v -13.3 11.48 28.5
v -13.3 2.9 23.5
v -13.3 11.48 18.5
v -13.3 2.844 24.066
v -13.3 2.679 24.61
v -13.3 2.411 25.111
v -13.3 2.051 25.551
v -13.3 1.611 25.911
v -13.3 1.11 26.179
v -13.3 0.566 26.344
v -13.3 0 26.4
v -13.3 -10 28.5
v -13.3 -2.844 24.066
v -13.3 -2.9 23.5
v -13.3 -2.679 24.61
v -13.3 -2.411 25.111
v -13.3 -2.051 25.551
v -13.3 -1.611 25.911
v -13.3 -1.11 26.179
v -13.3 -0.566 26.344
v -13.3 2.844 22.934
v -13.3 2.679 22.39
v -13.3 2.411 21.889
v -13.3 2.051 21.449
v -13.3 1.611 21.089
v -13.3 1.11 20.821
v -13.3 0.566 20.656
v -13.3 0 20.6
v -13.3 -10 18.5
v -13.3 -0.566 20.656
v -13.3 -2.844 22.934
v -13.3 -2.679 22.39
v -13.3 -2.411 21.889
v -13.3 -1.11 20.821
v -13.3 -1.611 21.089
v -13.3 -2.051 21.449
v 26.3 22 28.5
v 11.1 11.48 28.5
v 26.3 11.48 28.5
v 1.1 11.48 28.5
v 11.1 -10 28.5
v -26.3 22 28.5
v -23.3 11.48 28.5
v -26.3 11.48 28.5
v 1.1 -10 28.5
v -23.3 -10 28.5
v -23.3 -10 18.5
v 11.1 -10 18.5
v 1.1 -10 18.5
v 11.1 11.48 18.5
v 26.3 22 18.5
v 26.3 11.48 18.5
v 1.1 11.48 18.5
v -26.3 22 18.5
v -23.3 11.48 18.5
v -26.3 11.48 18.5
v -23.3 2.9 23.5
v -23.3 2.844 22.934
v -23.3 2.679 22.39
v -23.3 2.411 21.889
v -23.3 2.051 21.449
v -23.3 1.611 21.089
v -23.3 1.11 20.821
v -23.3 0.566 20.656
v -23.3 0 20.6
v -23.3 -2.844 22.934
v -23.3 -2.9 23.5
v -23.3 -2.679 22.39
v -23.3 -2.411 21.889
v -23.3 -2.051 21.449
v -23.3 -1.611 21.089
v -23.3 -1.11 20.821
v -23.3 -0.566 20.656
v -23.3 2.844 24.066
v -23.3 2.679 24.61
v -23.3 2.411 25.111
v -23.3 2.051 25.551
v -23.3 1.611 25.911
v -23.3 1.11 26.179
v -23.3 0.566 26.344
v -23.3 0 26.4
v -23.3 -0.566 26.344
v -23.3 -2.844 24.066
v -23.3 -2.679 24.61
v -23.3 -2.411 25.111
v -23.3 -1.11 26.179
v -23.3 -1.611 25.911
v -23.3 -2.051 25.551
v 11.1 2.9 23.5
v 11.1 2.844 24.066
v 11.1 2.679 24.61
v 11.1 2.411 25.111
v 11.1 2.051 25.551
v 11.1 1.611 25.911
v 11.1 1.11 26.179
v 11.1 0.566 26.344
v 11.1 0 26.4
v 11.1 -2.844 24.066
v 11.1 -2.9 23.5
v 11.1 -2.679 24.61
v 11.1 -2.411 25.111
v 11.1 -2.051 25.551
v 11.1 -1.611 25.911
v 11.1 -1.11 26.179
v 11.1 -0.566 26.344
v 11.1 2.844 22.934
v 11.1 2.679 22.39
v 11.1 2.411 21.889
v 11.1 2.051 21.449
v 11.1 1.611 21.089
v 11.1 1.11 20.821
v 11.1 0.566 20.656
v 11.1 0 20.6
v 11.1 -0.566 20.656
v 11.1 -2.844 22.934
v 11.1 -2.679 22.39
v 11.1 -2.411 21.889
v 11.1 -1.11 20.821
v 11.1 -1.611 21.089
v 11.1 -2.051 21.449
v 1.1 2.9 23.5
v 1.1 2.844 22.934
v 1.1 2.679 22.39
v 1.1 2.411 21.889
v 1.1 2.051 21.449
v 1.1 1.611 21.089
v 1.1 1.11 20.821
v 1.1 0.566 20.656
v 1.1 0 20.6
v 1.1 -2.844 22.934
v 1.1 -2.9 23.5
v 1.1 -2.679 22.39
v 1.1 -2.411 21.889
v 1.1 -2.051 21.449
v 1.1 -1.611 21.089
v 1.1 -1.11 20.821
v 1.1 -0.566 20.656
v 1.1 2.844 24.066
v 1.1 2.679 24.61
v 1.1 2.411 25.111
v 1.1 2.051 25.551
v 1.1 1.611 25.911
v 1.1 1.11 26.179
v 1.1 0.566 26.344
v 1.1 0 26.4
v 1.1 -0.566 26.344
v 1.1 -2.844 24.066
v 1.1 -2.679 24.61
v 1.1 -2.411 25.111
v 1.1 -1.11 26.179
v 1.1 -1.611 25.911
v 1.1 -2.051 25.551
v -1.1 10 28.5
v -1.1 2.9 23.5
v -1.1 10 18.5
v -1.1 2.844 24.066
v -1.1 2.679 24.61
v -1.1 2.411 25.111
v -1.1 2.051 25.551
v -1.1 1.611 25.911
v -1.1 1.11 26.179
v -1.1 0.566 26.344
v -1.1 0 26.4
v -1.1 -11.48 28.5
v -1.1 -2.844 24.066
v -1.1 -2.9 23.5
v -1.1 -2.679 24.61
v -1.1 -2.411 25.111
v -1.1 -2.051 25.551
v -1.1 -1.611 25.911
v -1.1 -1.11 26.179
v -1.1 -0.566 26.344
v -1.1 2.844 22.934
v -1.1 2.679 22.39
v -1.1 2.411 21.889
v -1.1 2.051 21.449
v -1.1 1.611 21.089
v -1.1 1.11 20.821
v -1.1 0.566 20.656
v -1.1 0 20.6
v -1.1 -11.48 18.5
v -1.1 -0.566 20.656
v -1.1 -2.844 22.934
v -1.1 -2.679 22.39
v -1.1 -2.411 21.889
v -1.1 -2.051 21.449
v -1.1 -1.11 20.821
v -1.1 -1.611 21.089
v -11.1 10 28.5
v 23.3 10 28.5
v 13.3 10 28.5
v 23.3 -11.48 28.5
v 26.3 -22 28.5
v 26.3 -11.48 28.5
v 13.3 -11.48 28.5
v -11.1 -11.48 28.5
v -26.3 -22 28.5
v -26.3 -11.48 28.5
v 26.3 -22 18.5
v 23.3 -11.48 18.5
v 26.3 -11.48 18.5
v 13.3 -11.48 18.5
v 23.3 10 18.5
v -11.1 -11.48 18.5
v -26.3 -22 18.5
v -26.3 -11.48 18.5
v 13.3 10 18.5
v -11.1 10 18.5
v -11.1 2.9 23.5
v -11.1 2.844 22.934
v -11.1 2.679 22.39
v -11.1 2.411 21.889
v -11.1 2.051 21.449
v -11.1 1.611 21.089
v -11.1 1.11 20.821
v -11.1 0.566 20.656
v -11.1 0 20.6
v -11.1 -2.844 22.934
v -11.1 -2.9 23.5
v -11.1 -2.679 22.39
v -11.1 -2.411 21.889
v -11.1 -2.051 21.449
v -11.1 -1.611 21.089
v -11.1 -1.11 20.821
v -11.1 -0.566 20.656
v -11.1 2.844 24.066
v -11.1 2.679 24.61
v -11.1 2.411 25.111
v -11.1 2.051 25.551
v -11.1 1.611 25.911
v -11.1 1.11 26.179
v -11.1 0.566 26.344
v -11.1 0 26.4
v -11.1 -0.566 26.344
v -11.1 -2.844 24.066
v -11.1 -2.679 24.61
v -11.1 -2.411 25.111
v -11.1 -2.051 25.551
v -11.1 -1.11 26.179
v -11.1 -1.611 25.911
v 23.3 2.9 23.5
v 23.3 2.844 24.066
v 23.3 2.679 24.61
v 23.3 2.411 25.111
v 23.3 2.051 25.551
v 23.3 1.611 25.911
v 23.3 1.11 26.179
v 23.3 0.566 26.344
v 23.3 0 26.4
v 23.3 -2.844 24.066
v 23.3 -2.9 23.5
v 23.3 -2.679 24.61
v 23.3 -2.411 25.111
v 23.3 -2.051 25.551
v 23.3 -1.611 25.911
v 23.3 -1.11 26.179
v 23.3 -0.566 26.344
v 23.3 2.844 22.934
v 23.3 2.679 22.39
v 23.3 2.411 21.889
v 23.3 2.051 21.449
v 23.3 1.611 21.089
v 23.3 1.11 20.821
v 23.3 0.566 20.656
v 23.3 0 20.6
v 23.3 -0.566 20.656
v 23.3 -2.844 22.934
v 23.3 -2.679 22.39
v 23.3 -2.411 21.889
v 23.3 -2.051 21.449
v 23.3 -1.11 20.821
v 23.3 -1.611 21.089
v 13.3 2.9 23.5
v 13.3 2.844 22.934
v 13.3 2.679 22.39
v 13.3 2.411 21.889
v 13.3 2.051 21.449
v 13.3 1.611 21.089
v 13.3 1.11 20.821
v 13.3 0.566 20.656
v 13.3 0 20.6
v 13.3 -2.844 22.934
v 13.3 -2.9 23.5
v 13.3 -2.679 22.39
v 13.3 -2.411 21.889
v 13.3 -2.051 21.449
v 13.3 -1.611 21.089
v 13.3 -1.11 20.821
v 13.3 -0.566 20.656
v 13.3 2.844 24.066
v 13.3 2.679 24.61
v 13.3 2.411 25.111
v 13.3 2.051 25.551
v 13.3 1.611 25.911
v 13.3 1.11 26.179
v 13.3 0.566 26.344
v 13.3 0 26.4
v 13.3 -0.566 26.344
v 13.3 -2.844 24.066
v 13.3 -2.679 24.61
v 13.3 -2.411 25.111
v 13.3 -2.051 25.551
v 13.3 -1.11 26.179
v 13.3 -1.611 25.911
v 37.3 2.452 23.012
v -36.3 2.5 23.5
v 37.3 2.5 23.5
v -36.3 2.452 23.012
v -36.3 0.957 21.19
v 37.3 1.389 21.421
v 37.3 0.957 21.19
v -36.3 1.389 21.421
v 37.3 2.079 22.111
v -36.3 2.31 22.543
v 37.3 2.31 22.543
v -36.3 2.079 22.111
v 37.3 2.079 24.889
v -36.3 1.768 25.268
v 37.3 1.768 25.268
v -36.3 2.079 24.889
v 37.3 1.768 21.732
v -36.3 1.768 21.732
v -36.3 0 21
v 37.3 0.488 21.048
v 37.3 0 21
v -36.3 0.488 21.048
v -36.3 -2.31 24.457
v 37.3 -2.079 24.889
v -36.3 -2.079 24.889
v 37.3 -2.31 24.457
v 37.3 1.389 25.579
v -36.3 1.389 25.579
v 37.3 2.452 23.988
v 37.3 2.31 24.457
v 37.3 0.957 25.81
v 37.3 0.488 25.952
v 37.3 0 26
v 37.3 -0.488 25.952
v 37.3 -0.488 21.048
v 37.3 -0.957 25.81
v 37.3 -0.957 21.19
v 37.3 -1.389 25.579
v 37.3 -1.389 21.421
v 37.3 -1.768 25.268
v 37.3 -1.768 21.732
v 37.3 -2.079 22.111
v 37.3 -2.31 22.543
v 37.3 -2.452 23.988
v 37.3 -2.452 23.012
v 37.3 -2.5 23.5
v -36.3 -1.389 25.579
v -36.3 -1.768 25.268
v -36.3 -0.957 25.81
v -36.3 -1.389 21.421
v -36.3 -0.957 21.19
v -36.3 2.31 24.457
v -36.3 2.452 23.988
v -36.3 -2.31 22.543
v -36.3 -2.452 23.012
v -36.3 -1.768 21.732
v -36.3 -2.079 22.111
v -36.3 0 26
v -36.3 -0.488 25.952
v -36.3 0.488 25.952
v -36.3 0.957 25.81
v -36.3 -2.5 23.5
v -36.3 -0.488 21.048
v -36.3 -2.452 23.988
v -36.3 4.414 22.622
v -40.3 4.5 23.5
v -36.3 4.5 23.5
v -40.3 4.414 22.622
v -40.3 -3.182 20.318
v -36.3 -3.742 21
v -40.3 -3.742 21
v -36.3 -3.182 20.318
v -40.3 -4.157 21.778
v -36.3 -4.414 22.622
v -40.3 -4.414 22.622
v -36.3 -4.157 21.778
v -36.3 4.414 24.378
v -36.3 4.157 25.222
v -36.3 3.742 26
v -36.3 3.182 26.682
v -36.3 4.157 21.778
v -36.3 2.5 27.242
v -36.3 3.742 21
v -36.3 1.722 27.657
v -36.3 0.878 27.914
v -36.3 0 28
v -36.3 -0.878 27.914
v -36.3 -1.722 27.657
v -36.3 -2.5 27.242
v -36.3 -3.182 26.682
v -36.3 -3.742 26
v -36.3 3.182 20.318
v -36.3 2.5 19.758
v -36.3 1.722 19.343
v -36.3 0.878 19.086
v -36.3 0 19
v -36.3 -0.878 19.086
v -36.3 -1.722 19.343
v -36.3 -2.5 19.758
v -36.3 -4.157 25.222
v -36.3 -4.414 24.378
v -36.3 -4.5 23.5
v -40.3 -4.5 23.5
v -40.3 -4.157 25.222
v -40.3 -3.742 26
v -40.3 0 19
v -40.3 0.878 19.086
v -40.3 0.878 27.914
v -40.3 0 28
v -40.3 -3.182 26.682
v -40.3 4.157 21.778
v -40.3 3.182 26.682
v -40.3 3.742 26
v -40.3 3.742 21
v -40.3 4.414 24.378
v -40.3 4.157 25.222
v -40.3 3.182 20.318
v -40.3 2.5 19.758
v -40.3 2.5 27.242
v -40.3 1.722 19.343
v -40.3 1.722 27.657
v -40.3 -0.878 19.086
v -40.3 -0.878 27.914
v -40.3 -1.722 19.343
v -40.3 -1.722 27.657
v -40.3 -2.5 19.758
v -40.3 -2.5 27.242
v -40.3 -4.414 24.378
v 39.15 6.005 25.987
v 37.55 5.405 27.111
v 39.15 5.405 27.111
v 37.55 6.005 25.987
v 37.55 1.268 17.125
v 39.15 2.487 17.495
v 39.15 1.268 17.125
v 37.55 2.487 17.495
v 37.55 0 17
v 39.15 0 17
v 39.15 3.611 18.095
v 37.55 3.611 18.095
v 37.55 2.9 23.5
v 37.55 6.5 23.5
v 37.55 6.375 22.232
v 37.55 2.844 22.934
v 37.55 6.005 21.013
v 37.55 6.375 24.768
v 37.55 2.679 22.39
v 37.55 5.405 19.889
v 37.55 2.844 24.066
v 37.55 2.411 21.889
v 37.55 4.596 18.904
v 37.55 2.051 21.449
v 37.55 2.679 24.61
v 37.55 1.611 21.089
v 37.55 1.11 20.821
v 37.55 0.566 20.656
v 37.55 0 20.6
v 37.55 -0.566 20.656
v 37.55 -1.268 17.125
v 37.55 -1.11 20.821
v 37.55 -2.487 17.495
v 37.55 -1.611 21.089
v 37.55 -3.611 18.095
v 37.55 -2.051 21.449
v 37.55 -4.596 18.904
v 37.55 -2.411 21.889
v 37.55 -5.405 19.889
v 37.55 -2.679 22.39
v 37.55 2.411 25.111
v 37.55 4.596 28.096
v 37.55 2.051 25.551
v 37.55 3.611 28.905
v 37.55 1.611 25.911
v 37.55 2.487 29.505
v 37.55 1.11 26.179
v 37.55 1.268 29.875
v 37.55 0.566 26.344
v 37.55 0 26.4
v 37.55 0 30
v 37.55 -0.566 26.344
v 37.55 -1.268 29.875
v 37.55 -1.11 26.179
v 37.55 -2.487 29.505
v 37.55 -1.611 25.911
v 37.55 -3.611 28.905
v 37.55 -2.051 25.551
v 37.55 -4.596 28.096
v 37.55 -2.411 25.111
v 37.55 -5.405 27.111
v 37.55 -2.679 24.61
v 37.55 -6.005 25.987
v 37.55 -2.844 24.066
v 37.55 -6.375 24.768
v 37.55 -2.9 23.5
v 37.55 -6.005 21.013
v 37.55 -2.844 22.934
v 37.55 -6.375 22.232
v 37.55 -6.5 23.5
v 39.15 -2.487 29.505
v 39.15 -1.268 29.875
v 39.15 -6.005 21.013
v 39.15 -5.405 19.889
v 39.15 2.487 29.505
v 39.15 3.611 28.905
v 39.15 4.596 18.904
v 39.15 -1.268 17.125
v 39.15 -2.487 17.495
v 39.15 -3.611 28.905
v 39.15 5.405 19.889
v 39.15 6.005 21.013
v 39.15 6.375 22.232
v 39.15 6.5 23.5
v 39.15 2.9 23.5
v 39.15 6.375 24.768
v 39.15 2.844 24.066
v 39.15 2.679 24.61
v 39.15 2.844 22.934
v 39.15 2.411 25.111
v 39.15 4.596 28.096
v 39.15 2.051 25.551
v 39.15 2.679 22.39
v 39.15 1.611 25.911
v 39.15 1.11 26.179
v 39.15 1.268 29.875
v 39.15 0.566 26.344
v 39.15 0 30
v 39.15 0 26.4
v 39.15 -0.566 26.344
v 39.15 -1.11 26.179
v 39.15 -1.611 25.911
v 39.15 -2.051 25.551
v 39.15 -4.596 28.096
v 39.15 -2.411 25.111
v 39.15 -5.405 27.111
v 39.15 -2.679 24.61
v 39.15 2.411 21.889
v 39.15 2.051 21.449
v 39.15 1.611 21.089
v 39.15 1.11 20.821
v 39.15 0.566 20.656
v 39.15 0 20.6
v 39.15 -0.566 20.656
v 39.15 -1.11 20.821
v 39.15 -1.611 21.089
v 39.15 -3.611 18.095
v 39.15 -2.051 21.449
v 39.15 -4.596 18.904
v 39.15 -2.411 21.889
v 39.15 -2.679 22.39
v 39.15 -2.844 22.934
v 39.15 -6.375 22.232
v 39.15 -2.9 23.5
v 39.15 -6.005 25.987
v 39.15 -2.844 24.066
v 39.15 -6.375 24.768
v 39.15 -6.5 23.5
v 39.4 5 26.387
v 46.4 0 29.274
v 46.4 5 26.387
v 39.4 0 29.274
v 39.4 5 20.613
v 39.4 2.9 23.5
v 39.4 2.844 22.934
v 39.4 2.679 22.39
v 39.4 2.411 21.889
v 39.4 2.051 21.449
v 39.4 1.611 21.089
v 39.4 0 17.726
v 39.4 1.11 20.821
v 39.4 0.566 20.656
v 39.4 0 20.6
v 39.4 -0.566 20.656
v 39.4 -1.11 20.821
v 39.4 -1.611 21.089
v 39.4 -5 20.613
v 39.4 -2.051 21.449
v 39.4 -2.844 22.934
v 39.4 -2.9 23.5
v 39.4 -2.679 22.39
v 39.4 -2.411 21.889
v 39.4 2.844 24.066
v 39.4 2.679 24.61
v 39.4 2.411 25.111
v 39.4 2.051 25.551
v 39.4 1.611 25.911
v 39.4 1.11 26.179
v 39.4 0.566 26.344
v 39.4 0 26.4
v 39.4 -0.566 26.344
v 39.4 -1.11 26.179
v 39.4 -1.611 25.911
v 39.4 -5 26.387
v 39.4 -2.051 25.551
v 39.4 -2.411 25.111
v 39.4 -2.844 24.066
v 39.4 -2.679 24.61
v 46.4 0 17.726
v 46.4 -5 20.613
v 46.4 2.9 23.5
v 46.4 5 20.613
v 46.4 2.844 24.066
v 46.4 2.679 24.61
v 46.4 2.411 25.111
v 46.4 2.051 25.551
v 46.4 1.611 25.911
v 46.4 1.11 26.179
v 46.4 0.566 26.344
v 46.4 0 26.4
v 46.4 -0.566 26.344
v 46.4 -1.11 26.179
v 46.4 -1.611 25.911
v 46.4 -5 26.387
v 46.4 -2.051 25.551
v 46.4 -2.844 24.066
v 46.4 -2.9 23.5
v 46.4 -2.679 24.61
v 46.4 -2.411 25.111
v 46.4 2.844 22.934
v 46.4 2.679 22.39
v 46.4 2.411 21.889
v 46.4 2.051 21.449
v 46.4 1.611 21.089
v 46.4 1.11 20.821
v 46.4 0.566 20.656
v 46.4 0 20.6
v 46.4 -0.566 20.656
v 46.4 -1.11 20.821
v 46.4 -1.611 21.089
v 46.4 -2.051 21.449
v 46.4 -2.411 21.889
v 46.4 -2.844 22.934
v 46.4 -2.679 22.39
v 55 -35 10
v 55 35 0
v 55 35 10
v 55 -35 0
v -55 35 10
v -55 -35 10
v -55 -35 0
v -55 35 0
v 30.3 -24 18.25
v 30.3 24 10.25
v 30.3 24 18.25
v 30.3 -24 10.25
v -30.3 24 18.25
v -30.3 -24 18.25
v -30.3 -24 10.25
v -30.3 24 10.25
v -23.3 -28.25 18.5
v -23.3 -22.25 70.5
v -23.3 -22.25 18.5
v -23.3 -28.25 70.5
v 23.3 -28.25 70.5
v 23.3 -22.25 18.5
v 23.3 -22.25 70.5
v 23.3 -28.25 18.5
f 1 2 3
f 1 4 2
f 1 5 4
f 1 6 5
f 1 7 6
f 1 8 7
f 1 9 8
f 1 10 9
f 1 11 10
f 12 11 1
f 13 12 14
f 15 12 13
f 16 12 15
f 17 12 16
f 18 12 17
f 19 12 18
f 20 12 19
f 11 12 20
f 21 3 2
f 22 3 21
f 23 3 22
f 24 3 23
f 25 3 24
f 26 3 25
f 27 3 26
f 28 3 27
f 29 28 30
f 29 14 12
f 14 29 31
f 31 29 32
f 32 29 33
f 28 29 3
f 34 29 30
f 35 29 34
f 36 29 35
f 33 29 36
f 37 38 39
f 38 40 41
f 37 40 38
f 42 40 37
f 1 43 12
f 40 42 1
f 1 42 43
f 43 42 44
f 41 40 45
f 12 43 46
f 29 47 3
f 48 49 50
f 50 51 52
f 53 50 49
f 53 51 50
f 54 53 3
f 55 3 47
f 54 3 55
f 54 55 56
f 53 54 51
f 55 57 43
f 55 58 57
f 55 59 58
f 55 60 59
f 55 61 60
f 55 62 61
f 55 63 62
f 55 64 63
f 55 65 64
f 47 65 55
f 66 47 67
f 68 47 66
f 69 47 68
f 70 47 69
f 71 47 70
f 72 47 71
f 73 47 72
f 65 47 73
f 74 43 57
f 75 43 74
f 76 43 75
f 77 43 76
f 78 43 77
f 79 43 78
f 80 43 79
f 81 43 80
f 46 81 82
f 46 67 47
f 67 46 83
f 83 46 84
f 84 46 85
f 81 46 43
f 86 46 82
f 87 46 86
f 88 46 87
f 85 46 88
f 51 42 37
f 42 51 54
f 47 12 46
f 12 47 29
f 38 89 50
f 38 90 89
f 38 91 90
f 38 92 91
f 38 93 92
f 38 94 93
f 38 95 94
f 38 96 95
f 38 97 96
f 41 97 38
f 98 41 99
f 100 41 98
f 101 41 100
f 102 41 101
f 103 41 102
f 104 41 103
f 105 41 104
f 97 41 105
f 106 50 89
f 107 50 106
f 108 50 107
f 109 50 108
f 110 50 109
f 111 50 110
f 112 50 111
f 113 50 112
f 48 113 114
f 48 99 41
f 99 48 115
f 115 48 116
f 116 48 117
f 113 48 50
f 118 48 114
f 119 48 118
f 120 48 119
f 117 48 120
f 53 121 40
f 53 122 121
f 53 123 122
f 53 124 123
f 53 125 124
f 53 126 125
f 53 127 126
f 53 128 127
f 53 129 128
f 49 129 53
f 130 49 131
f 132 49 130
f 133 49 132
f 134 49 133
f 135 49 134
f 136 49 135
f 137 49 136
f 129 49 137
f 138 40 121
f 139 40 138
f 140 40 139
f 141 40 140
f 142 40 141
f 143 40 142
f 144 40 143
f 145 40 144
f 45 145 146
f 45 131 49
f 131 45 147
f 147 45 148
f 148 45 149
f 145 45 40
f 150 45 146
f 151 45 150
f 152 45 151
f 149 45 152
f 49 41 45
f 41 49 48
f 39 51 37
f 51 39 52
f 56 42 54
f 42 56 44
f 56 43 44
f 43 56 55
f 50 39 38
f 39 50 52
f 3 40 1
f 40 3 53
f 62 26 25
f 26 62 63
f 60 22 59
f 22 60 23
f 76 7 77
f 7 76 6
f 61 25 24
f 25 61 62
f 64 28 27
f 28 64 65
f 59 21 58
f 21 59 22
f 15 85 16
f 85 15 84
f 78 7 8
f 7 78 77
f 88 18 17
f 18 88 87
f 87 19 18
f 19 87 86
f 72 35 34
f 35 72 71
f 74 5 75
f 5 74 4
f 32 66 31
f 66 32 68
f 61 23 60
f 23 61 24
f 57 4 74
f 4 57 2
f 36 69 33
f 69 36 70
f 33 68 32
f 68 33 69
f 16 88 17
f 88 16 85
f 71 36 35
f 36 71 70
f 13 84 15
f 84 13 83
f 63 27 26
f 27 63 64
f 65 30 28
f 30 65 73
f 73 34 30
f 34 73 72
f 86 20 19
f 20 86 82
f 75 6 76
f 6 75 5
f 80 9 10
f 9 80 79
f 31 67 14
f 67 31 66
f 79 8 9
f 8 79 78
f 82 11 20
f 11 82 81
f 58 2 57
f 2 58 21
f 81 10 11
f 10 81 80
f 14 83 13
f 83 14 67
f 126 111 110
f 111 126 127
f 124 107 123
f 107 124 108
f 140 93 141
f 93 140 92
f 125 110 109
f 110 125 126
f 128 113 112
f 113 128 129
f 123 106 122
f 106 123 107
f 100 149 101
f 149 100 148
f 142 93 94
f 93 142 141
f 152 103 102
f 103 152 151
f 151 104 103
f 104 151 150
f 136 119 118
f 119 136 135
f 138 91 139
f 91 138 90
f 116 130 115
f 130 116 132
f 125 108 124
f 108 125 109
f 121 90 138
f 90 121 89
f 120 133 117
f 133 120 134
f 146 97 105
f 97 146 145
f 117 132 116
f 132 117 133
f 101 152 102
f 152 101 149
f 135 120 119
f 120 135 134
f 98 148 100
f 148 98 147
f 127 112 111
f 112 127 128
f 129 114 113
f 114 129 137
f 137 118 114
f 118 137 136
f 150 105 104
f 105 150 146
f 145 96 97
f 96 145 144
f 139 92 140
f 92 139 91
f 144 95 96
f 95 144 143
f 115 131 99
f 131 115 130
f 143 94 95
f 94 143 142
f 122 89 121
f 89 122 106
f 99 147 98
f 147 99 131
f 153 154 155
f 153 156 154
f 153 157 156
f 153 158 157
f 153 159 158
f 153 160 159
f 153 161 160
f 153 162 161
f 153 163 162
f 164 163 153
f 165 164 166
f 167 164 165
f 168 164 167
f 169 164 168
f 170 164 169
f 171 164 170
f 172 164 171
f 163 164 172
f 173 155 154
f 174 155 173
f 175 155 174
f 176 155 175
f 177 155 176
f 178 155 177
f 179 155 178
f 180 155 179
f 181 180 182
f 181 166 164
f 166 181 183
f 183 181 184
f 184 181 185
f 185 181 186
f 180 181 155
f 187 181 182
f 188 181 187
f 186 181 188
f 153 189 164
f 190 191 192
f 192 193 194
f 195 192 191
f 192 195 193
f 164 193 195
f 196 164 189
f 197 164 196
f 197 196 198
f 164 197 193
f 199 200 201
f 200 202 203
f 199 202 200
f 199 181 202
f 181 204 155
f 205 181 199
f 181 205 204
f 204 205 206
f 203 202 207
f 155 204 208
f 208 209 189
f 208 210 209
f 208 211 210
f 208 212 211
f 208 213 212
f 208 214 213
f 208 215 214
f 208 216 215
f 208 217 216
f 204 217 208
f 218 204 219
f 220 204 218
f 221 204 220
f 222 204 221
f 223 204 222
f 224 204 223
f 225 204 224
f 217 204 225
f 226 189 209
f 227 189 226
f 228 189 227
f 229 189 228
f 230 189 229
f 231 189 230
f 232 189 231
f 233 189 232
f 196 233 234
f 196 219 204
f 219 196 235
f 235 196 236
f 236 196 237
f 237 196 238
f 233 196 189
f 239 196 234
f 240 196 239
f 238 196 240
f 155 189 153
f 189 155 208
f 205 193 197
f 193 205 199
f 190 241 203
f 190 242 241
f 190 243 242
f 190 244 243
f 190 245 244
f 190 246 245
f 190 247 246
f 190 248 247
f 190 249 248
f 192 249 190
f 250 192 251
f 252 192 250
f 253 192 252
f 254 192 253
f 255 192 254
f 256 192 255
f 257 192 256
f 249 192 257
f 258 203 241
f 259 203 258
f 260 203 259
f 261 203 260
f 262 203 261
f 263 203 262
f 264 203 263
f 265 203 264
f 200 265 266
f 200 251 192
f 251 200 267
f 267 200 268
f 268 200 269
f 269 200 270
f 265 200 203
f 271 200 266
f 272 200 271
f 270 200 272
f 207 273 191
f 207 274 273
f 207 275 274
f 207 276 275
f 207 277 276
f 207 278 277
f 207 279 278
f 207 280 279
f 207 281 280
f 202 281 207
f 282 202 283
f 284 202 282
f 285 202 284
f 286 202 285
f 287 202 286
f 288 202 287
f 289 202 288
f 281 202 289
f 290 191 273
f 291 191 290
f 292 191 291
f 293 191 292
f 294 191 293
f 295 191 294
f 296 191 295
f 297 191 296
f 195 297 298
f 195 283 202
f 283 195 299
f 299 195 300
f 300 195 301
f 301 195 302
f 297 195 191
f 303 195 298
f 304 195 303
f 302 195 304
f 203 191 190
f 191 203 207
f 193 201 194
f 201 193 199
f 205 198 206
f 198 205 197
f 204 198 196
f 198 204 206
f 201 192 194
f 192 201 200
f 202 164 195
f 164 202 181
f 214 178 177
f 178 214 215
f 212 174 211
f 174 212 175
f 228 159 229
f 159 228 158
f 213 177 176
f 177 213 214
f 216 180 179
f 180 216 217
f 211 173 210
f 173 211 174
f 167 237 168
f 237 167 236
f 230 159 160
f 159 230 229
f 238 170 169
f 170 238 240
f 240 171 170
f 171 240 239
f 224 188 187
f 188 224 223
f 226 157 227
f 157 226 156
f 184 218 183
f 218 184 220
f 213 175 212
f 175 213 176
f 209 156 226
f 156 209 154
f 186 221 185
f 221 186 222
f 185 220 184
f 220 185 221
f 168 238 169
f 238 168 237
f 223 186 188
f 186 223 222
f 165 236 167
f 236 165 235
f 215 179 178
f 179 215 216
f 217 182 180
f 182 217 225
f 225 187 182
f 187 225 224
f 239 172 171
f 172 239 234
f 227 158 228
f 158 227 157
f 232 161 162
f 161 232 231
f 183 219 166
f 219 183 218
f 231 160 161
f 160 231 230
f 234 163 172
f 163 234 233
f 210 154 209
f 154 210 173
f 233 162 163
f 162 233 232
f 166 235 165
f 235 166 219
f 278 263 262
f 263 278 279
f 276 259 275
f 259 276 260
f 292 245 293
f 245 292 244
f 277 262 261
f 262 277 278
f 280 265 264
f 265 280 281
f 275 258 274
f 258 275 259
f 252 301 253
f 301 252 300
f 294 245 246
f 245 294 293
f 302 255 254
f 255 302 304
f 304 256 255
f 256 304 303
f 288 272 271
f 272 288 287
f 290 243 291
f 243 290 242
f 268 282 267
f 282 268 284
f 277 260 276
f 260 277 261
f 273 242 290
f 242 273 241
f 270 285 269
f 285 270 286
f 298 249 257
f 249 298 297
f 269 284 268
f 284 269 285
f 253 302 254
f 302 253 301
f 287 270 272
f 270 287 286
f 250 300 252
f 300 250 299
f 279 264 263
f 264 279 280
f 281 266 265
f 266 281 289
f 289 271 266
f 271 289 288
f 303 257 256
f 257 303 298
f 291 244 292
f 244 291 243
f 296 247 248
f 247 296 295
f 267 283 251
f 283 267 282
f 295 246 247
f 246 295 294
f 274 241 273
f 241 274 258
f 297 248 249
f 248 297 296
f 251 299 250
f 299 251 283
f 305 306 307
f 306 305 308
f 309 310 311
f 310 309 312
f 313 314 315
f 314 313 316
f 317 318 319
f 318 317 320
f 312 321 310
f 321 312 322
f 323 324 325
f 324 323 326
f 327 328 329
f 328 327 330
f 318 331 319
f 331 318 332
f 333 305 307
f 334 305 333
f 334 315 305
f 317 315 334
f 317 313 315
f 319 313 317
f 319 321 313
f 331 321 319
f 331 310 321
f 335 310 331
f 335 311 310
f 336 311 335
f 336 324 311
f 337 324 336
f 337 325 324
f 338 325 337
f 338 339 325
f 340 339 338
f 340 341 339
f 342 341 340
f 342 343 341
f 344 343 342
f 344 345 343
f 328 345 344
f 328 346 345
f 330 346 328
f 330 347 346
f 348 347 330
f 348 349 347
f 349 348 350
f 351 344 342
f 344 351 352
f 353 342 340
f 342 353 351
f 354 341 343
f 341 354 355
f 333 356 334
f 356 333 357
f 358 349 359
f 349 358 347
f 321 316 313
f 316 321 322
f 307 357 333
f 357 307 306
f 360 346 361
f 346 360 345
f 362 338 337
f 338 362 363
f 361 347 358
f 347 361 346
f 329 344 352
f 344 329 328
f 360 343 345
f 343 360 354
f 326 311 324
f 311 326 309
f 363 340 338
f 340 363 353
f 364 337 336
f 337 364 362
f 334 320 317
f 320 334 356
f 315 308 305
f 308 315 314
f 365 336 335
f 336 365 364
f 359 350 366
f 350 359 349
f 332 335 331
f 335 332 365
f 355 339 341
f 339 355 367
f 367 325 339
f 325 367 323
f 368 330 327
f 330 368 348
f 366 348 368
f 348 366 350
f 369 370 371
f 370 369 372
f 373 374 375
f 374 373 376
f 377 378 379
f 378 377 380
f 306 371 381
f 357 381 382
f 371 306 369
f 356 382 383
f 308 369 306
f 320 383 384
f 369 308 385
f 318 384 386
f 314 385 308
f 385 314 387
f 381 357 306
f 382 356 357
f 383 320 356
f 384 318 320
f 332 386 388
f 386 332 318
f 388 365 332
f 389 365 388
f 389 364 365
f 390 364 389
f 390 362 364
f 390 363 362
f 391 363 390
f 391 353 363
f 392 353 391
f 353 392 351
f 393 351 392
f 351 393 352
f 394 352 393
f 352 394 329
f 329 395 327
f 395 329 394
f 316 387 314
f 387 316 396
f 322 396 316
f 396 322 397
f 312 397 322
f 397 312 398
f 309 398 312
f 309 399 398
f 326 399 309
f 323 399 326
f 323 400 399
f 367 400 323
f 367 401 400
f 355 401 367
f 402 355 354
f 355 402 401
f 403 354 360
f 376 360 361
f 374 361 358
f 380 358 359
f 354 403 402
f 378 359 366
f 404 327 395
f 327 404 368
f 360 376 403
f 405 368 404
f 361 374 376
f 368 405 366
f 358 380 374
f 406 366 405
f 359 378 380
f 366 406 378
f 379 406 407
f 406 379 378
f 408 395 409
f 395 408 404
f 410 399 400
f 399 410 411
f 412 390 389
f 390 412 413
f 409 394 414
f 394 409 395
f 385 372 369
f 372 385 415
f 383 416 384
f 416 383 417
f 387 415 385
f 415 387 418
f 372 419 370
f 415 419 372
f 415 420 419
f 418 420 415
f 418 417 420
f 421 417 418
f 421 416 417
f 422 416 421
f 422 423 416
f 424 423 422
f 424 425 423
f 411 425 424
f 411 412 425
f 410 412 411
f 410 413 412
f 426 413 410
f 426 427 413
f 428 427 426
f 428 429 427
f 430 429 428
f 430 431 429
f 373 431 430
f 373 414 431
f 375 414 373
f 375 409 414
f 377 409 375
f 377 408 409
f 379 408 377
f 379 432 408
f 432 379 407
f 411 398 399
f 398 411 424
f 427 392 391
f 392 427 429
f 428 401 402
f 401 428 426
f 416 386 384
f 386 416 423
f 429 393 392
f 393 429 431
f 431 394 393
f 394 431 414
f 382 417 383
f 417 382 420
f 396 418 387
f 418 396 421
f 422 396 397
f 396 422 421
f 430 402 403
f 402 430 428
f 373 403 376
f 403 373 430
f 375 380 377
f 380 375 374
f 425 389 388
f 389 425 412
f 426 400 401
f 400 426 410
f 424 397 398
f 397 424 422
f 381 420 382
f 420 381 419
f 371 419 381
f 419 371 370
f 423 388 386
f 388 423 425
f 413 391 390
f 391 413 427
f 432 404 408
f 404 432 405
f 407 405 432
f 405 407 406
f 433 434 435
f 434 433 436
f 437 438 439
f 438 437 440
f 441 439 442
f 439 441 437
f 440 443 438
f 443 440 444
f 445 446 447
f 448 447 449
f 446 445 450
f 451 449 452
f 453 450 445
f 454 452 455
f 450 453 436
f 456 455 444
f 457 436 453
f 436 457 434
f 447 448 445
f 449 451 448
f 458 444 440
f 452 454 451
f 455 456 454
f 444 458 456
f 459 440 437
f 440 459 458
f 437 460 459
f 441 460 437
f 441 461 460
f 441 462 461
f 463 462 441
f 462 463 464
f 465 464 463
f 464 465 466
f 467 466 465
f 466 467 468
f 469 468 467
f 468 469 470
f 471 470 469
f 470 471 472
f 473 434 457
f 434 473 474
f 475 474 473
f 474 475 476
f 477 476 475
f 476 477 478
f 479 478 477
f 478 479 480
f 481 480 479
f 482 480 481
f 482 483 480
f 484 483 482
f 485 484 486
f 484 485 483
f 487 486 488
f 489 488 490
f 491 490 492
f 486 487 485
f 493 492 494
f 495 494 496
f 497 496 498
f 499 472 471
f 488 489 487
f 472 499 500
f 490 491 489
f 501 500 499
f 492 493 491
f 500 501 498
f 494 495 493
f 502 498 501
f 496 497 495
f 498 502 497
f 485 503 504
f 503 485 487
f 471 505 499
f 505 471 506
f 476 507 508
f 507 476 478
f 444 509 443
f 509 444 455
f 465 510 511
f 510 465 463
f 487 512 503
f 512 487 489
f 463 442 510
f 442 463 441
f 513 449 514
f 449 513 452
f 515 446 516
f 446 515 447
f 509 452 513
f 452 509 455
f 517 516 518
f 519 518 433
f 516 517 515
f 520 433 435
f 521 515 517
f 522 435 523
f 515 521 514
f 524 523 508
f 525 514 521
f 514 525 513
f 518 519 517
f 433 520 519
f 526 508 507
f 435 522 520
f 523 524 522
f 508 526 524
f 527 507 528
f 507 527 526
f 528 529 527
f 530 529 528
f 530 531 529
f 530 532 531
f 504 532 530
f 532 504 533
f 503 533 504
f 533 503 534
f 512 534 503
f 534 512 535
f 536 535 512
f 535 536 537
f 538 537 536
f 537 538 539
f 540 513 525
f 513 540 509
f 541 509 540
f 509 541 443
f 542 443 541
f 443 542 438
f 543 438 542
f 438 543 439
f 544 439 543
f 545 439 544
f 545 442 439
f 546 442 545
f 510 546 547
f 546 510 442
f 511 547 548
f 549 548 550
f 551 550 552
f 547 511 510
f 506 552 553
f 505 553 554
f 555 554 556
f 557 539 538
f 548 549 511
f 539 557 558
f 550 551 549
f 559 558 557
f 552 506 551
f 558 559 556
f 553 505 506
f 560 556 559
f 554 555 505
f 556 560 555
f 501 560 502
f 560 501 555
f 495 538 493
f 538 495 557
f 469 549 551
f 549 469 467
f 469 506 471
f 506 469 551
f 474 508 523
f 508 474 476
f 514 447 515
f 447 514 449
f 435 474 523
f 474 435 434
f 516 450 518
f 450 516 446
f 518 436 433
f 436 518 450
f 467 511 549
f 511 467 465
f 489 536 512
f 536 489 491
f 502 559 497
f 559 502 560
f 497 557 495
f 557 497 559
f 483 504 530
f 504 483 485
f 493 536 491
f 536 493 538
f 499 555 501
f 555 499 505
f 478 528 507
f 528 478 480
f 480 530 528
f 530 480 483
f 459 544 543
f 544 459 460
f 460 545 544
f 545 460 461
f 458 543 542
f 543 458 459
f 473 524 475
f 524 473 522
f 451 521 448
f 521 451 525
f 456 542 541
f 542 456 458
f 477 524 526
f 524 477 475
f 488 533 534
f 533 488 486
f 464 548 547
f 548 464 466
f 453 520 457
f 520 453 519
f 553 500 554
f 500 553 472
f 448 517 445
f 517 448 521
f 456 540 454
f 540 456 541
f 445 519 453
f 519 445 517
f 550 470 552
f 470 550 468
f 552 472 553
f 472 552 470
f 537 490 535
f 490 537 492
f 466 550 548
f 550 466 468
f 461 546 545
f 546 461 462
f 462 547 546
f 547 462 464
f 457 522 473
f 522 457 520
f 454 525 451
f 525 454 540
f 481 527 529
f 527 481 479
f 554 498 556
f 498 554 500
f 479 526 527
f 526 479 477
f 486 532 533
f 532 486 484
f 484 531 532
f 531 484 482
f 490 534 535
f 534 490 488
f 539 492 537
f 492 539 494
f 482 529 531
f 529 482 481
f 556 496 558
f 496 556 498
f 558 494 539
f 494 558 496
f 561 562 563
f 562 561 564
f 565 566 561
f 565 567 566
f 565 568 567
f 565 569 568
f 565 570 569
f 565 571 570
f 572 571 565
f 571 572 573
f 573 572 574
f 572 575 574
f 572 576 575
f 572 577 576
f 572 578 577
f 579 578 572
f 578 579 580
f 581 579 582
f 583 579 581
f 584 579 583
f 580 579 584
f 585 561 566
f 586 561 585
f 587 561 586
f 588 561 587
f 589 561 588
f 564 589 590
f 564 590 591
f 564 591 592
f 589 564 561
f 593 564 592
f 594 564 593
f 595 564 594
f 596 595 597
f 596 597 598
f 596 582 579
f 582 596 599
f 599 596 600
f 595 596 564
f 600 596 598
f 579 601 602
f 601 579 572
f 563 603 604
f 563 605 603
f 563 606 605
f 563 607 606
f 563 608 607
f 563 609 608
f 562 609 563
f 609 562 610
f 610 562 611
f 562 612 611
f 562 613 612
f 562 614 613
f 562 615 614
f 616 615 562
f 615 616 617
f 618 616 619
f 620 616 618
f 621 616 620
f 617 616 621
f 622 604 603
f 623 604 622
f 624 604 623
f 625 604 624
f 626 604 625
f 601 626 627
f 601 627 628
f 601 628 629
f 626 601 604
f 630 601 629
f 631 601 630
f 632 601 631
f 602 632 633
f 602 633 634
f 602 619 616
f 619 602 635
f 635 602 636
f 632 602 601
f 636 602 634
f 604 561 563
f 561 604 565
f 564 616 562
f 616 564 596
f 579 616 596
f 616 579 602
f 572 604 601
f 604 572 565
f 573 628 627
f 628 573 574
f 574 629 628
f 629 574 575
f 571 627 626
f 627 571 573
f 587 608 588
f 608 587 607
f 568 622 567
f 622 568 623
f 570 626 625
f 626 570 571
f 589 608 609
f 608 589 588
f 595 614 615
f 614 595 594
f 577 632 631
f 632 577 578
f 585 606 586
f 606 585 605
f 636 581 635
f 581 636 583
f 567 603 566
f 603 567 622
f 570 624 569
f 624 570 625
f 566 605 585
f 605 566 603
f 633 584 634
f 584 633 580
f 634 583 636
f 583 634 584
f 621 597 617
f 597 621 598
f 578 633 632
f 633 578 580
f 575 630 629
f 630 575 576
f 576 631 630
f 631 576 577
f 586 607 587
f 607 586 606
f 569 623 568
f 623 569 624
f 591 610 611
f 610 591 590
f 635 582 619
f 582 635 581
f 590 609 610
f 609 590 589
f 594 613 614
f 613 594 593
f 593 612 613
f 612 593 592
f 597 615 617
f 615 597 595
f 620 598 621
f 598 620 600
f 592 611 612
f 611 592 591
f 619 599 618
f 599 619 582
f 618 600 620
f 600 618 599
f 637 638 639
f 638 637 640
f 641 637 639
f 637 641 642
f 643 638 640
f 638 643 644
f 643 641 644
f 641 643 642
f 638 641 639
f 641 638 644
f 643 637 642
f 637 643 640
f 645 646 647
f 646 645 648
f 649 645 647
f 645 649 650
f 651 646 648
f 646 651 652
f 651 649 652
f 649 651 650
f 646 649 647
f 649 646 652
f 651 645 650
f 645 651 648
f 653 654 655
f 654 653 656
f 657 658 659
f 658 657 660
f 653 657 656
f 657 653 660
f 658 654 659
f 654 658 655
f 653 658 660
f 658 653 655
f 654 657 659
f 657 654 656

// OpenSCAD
$fn = 32;

// ------------------------------------------------------------------------
// Comb hinge with flap: leaf 52.6 x 22 mm, pin d5, flap 52 mm
// Every part is its own module, assembly() places every instance.
// ------------------------------------------------------------------------

// --- part 1 ---
module hinge_bed() {
  difference() {
    translate([-55, -35, 0]) cube([110, 70, 10]);
  }
}

// --- part 2 ---
module hinge_riser() {
  difference() {
    translate([-30.3, -24, 0]) cube([60.6, 48, 8]);
  }
}

// --- part 3 ---
module hinge_leaf_a() {
  difference() {
    union() {
      translate([-23.3, -10, -5]) cube([10, 32, 10]);
      translate([1.1, -10, -5]) cube([10, 32, 10]);
      translate([-26.3, 11.48, -5]) cube([52.6, 10.52, 10]);
    }
    translate([-18.3, 0, 0]) rotate([0, 90, 0]) cylinder(h = 12, d = 5.8, center = true);
    translate([6.1, 0, 0]) rotate([0, 90, 0]) cylinder(h = 12, d = 5.8, center = true);
  }
}

// --- part 4 ---
module hinge_leaf_b() {
  difference() {
    union() {
      translate([-11.1, -22, -5]) cube([10, 32, 10]);
      translate([13.3, -22, -5]) cube([10, 32, 10]);
      translate([-26.3, -22, -5]) cube([52.6, 10.52, 10]);
    }
    translate([-6.1, 0, 0]) rotate([0, 90, 0]) cylinder(h = 12, d = 5.8, center = true);
    translate([18.3, 0, 0]) rotate([0, 90, 0]) cylinder(h = 12, d = 5.8, center = true);
  }
}

// --- part 5 ---
module hinge_flap() {
  difference() {
    translate([-23.3, -26, 0]) cube([46.6, 52, 6]);
  }
}

// --- part 6 ---
module hinge_pin() {
  rotate([0, 90, 0]) cylinder(h = 74.6, d = 5, center = true);
  translate([-40.3, 0, 0]) rotate([0, 90, 0]) cylinder(h = 4, d = 9);
}

// --- part 7 ---
module pin_washer() {
  difference() {
      translate([0, 0, 0]) cylinder(h = 1.6, d = 13);
      translate([0, 0, -1]) cylinder(h = 3.6, d = 5.8);
    }
}

// --- part 8 ---
module pin_nut() {
  difference() {
    linear_extrude(height = 7) polygon(points = [[5.774, 0], [2.887, 5], [-2.887, 5], [-5.774, 0], [-2.887, -5], [2.887, -5]]);
    translate([0, 0, -1]) cylinder(h = 9, d = 5.8);
  }
}

// --- assembly ---
module assembly() {
  color([0.80, 0.24, 0.20]) translate([0, 0, 0]) rotate([0, 0, 0]) hinge_bed();
  color([0.20, 0.45, 0.75]) translate([0, 0, 10.25]) rotate([0, 0, 0]) hinge_riser();
  color([0.25, 0.62, 0.32]) translate([0, 0, 23.5]) rotate([0, 0, 0]) hinge_leaf_a();
  color([0.92, 0.70, 0.18]) translate([0, 0, 23.5]) rotate([0, 0, 0]) hinge_leaf_b();
  color([0.58, 0.35, 0.70]) translate([0, -22.25, 44.5]) rotate([90, 0, 0]) hinge_flap();
  color([0.16, 0.66, 0.66]) translate([0, 0, 23.5]) rotate([0, 0, 0]) hinge_pin();
  color([0.85, 0.48, 0.18]) translate([37.55, 0, 23.5]) rotate([0, 90, 0]) pin_washer();
  color([0.55, 0.60, 0.65]) translate([39.4, 0, 23.5]) rotate([0, 90, 0]) pin_nut();
}

assembly();
